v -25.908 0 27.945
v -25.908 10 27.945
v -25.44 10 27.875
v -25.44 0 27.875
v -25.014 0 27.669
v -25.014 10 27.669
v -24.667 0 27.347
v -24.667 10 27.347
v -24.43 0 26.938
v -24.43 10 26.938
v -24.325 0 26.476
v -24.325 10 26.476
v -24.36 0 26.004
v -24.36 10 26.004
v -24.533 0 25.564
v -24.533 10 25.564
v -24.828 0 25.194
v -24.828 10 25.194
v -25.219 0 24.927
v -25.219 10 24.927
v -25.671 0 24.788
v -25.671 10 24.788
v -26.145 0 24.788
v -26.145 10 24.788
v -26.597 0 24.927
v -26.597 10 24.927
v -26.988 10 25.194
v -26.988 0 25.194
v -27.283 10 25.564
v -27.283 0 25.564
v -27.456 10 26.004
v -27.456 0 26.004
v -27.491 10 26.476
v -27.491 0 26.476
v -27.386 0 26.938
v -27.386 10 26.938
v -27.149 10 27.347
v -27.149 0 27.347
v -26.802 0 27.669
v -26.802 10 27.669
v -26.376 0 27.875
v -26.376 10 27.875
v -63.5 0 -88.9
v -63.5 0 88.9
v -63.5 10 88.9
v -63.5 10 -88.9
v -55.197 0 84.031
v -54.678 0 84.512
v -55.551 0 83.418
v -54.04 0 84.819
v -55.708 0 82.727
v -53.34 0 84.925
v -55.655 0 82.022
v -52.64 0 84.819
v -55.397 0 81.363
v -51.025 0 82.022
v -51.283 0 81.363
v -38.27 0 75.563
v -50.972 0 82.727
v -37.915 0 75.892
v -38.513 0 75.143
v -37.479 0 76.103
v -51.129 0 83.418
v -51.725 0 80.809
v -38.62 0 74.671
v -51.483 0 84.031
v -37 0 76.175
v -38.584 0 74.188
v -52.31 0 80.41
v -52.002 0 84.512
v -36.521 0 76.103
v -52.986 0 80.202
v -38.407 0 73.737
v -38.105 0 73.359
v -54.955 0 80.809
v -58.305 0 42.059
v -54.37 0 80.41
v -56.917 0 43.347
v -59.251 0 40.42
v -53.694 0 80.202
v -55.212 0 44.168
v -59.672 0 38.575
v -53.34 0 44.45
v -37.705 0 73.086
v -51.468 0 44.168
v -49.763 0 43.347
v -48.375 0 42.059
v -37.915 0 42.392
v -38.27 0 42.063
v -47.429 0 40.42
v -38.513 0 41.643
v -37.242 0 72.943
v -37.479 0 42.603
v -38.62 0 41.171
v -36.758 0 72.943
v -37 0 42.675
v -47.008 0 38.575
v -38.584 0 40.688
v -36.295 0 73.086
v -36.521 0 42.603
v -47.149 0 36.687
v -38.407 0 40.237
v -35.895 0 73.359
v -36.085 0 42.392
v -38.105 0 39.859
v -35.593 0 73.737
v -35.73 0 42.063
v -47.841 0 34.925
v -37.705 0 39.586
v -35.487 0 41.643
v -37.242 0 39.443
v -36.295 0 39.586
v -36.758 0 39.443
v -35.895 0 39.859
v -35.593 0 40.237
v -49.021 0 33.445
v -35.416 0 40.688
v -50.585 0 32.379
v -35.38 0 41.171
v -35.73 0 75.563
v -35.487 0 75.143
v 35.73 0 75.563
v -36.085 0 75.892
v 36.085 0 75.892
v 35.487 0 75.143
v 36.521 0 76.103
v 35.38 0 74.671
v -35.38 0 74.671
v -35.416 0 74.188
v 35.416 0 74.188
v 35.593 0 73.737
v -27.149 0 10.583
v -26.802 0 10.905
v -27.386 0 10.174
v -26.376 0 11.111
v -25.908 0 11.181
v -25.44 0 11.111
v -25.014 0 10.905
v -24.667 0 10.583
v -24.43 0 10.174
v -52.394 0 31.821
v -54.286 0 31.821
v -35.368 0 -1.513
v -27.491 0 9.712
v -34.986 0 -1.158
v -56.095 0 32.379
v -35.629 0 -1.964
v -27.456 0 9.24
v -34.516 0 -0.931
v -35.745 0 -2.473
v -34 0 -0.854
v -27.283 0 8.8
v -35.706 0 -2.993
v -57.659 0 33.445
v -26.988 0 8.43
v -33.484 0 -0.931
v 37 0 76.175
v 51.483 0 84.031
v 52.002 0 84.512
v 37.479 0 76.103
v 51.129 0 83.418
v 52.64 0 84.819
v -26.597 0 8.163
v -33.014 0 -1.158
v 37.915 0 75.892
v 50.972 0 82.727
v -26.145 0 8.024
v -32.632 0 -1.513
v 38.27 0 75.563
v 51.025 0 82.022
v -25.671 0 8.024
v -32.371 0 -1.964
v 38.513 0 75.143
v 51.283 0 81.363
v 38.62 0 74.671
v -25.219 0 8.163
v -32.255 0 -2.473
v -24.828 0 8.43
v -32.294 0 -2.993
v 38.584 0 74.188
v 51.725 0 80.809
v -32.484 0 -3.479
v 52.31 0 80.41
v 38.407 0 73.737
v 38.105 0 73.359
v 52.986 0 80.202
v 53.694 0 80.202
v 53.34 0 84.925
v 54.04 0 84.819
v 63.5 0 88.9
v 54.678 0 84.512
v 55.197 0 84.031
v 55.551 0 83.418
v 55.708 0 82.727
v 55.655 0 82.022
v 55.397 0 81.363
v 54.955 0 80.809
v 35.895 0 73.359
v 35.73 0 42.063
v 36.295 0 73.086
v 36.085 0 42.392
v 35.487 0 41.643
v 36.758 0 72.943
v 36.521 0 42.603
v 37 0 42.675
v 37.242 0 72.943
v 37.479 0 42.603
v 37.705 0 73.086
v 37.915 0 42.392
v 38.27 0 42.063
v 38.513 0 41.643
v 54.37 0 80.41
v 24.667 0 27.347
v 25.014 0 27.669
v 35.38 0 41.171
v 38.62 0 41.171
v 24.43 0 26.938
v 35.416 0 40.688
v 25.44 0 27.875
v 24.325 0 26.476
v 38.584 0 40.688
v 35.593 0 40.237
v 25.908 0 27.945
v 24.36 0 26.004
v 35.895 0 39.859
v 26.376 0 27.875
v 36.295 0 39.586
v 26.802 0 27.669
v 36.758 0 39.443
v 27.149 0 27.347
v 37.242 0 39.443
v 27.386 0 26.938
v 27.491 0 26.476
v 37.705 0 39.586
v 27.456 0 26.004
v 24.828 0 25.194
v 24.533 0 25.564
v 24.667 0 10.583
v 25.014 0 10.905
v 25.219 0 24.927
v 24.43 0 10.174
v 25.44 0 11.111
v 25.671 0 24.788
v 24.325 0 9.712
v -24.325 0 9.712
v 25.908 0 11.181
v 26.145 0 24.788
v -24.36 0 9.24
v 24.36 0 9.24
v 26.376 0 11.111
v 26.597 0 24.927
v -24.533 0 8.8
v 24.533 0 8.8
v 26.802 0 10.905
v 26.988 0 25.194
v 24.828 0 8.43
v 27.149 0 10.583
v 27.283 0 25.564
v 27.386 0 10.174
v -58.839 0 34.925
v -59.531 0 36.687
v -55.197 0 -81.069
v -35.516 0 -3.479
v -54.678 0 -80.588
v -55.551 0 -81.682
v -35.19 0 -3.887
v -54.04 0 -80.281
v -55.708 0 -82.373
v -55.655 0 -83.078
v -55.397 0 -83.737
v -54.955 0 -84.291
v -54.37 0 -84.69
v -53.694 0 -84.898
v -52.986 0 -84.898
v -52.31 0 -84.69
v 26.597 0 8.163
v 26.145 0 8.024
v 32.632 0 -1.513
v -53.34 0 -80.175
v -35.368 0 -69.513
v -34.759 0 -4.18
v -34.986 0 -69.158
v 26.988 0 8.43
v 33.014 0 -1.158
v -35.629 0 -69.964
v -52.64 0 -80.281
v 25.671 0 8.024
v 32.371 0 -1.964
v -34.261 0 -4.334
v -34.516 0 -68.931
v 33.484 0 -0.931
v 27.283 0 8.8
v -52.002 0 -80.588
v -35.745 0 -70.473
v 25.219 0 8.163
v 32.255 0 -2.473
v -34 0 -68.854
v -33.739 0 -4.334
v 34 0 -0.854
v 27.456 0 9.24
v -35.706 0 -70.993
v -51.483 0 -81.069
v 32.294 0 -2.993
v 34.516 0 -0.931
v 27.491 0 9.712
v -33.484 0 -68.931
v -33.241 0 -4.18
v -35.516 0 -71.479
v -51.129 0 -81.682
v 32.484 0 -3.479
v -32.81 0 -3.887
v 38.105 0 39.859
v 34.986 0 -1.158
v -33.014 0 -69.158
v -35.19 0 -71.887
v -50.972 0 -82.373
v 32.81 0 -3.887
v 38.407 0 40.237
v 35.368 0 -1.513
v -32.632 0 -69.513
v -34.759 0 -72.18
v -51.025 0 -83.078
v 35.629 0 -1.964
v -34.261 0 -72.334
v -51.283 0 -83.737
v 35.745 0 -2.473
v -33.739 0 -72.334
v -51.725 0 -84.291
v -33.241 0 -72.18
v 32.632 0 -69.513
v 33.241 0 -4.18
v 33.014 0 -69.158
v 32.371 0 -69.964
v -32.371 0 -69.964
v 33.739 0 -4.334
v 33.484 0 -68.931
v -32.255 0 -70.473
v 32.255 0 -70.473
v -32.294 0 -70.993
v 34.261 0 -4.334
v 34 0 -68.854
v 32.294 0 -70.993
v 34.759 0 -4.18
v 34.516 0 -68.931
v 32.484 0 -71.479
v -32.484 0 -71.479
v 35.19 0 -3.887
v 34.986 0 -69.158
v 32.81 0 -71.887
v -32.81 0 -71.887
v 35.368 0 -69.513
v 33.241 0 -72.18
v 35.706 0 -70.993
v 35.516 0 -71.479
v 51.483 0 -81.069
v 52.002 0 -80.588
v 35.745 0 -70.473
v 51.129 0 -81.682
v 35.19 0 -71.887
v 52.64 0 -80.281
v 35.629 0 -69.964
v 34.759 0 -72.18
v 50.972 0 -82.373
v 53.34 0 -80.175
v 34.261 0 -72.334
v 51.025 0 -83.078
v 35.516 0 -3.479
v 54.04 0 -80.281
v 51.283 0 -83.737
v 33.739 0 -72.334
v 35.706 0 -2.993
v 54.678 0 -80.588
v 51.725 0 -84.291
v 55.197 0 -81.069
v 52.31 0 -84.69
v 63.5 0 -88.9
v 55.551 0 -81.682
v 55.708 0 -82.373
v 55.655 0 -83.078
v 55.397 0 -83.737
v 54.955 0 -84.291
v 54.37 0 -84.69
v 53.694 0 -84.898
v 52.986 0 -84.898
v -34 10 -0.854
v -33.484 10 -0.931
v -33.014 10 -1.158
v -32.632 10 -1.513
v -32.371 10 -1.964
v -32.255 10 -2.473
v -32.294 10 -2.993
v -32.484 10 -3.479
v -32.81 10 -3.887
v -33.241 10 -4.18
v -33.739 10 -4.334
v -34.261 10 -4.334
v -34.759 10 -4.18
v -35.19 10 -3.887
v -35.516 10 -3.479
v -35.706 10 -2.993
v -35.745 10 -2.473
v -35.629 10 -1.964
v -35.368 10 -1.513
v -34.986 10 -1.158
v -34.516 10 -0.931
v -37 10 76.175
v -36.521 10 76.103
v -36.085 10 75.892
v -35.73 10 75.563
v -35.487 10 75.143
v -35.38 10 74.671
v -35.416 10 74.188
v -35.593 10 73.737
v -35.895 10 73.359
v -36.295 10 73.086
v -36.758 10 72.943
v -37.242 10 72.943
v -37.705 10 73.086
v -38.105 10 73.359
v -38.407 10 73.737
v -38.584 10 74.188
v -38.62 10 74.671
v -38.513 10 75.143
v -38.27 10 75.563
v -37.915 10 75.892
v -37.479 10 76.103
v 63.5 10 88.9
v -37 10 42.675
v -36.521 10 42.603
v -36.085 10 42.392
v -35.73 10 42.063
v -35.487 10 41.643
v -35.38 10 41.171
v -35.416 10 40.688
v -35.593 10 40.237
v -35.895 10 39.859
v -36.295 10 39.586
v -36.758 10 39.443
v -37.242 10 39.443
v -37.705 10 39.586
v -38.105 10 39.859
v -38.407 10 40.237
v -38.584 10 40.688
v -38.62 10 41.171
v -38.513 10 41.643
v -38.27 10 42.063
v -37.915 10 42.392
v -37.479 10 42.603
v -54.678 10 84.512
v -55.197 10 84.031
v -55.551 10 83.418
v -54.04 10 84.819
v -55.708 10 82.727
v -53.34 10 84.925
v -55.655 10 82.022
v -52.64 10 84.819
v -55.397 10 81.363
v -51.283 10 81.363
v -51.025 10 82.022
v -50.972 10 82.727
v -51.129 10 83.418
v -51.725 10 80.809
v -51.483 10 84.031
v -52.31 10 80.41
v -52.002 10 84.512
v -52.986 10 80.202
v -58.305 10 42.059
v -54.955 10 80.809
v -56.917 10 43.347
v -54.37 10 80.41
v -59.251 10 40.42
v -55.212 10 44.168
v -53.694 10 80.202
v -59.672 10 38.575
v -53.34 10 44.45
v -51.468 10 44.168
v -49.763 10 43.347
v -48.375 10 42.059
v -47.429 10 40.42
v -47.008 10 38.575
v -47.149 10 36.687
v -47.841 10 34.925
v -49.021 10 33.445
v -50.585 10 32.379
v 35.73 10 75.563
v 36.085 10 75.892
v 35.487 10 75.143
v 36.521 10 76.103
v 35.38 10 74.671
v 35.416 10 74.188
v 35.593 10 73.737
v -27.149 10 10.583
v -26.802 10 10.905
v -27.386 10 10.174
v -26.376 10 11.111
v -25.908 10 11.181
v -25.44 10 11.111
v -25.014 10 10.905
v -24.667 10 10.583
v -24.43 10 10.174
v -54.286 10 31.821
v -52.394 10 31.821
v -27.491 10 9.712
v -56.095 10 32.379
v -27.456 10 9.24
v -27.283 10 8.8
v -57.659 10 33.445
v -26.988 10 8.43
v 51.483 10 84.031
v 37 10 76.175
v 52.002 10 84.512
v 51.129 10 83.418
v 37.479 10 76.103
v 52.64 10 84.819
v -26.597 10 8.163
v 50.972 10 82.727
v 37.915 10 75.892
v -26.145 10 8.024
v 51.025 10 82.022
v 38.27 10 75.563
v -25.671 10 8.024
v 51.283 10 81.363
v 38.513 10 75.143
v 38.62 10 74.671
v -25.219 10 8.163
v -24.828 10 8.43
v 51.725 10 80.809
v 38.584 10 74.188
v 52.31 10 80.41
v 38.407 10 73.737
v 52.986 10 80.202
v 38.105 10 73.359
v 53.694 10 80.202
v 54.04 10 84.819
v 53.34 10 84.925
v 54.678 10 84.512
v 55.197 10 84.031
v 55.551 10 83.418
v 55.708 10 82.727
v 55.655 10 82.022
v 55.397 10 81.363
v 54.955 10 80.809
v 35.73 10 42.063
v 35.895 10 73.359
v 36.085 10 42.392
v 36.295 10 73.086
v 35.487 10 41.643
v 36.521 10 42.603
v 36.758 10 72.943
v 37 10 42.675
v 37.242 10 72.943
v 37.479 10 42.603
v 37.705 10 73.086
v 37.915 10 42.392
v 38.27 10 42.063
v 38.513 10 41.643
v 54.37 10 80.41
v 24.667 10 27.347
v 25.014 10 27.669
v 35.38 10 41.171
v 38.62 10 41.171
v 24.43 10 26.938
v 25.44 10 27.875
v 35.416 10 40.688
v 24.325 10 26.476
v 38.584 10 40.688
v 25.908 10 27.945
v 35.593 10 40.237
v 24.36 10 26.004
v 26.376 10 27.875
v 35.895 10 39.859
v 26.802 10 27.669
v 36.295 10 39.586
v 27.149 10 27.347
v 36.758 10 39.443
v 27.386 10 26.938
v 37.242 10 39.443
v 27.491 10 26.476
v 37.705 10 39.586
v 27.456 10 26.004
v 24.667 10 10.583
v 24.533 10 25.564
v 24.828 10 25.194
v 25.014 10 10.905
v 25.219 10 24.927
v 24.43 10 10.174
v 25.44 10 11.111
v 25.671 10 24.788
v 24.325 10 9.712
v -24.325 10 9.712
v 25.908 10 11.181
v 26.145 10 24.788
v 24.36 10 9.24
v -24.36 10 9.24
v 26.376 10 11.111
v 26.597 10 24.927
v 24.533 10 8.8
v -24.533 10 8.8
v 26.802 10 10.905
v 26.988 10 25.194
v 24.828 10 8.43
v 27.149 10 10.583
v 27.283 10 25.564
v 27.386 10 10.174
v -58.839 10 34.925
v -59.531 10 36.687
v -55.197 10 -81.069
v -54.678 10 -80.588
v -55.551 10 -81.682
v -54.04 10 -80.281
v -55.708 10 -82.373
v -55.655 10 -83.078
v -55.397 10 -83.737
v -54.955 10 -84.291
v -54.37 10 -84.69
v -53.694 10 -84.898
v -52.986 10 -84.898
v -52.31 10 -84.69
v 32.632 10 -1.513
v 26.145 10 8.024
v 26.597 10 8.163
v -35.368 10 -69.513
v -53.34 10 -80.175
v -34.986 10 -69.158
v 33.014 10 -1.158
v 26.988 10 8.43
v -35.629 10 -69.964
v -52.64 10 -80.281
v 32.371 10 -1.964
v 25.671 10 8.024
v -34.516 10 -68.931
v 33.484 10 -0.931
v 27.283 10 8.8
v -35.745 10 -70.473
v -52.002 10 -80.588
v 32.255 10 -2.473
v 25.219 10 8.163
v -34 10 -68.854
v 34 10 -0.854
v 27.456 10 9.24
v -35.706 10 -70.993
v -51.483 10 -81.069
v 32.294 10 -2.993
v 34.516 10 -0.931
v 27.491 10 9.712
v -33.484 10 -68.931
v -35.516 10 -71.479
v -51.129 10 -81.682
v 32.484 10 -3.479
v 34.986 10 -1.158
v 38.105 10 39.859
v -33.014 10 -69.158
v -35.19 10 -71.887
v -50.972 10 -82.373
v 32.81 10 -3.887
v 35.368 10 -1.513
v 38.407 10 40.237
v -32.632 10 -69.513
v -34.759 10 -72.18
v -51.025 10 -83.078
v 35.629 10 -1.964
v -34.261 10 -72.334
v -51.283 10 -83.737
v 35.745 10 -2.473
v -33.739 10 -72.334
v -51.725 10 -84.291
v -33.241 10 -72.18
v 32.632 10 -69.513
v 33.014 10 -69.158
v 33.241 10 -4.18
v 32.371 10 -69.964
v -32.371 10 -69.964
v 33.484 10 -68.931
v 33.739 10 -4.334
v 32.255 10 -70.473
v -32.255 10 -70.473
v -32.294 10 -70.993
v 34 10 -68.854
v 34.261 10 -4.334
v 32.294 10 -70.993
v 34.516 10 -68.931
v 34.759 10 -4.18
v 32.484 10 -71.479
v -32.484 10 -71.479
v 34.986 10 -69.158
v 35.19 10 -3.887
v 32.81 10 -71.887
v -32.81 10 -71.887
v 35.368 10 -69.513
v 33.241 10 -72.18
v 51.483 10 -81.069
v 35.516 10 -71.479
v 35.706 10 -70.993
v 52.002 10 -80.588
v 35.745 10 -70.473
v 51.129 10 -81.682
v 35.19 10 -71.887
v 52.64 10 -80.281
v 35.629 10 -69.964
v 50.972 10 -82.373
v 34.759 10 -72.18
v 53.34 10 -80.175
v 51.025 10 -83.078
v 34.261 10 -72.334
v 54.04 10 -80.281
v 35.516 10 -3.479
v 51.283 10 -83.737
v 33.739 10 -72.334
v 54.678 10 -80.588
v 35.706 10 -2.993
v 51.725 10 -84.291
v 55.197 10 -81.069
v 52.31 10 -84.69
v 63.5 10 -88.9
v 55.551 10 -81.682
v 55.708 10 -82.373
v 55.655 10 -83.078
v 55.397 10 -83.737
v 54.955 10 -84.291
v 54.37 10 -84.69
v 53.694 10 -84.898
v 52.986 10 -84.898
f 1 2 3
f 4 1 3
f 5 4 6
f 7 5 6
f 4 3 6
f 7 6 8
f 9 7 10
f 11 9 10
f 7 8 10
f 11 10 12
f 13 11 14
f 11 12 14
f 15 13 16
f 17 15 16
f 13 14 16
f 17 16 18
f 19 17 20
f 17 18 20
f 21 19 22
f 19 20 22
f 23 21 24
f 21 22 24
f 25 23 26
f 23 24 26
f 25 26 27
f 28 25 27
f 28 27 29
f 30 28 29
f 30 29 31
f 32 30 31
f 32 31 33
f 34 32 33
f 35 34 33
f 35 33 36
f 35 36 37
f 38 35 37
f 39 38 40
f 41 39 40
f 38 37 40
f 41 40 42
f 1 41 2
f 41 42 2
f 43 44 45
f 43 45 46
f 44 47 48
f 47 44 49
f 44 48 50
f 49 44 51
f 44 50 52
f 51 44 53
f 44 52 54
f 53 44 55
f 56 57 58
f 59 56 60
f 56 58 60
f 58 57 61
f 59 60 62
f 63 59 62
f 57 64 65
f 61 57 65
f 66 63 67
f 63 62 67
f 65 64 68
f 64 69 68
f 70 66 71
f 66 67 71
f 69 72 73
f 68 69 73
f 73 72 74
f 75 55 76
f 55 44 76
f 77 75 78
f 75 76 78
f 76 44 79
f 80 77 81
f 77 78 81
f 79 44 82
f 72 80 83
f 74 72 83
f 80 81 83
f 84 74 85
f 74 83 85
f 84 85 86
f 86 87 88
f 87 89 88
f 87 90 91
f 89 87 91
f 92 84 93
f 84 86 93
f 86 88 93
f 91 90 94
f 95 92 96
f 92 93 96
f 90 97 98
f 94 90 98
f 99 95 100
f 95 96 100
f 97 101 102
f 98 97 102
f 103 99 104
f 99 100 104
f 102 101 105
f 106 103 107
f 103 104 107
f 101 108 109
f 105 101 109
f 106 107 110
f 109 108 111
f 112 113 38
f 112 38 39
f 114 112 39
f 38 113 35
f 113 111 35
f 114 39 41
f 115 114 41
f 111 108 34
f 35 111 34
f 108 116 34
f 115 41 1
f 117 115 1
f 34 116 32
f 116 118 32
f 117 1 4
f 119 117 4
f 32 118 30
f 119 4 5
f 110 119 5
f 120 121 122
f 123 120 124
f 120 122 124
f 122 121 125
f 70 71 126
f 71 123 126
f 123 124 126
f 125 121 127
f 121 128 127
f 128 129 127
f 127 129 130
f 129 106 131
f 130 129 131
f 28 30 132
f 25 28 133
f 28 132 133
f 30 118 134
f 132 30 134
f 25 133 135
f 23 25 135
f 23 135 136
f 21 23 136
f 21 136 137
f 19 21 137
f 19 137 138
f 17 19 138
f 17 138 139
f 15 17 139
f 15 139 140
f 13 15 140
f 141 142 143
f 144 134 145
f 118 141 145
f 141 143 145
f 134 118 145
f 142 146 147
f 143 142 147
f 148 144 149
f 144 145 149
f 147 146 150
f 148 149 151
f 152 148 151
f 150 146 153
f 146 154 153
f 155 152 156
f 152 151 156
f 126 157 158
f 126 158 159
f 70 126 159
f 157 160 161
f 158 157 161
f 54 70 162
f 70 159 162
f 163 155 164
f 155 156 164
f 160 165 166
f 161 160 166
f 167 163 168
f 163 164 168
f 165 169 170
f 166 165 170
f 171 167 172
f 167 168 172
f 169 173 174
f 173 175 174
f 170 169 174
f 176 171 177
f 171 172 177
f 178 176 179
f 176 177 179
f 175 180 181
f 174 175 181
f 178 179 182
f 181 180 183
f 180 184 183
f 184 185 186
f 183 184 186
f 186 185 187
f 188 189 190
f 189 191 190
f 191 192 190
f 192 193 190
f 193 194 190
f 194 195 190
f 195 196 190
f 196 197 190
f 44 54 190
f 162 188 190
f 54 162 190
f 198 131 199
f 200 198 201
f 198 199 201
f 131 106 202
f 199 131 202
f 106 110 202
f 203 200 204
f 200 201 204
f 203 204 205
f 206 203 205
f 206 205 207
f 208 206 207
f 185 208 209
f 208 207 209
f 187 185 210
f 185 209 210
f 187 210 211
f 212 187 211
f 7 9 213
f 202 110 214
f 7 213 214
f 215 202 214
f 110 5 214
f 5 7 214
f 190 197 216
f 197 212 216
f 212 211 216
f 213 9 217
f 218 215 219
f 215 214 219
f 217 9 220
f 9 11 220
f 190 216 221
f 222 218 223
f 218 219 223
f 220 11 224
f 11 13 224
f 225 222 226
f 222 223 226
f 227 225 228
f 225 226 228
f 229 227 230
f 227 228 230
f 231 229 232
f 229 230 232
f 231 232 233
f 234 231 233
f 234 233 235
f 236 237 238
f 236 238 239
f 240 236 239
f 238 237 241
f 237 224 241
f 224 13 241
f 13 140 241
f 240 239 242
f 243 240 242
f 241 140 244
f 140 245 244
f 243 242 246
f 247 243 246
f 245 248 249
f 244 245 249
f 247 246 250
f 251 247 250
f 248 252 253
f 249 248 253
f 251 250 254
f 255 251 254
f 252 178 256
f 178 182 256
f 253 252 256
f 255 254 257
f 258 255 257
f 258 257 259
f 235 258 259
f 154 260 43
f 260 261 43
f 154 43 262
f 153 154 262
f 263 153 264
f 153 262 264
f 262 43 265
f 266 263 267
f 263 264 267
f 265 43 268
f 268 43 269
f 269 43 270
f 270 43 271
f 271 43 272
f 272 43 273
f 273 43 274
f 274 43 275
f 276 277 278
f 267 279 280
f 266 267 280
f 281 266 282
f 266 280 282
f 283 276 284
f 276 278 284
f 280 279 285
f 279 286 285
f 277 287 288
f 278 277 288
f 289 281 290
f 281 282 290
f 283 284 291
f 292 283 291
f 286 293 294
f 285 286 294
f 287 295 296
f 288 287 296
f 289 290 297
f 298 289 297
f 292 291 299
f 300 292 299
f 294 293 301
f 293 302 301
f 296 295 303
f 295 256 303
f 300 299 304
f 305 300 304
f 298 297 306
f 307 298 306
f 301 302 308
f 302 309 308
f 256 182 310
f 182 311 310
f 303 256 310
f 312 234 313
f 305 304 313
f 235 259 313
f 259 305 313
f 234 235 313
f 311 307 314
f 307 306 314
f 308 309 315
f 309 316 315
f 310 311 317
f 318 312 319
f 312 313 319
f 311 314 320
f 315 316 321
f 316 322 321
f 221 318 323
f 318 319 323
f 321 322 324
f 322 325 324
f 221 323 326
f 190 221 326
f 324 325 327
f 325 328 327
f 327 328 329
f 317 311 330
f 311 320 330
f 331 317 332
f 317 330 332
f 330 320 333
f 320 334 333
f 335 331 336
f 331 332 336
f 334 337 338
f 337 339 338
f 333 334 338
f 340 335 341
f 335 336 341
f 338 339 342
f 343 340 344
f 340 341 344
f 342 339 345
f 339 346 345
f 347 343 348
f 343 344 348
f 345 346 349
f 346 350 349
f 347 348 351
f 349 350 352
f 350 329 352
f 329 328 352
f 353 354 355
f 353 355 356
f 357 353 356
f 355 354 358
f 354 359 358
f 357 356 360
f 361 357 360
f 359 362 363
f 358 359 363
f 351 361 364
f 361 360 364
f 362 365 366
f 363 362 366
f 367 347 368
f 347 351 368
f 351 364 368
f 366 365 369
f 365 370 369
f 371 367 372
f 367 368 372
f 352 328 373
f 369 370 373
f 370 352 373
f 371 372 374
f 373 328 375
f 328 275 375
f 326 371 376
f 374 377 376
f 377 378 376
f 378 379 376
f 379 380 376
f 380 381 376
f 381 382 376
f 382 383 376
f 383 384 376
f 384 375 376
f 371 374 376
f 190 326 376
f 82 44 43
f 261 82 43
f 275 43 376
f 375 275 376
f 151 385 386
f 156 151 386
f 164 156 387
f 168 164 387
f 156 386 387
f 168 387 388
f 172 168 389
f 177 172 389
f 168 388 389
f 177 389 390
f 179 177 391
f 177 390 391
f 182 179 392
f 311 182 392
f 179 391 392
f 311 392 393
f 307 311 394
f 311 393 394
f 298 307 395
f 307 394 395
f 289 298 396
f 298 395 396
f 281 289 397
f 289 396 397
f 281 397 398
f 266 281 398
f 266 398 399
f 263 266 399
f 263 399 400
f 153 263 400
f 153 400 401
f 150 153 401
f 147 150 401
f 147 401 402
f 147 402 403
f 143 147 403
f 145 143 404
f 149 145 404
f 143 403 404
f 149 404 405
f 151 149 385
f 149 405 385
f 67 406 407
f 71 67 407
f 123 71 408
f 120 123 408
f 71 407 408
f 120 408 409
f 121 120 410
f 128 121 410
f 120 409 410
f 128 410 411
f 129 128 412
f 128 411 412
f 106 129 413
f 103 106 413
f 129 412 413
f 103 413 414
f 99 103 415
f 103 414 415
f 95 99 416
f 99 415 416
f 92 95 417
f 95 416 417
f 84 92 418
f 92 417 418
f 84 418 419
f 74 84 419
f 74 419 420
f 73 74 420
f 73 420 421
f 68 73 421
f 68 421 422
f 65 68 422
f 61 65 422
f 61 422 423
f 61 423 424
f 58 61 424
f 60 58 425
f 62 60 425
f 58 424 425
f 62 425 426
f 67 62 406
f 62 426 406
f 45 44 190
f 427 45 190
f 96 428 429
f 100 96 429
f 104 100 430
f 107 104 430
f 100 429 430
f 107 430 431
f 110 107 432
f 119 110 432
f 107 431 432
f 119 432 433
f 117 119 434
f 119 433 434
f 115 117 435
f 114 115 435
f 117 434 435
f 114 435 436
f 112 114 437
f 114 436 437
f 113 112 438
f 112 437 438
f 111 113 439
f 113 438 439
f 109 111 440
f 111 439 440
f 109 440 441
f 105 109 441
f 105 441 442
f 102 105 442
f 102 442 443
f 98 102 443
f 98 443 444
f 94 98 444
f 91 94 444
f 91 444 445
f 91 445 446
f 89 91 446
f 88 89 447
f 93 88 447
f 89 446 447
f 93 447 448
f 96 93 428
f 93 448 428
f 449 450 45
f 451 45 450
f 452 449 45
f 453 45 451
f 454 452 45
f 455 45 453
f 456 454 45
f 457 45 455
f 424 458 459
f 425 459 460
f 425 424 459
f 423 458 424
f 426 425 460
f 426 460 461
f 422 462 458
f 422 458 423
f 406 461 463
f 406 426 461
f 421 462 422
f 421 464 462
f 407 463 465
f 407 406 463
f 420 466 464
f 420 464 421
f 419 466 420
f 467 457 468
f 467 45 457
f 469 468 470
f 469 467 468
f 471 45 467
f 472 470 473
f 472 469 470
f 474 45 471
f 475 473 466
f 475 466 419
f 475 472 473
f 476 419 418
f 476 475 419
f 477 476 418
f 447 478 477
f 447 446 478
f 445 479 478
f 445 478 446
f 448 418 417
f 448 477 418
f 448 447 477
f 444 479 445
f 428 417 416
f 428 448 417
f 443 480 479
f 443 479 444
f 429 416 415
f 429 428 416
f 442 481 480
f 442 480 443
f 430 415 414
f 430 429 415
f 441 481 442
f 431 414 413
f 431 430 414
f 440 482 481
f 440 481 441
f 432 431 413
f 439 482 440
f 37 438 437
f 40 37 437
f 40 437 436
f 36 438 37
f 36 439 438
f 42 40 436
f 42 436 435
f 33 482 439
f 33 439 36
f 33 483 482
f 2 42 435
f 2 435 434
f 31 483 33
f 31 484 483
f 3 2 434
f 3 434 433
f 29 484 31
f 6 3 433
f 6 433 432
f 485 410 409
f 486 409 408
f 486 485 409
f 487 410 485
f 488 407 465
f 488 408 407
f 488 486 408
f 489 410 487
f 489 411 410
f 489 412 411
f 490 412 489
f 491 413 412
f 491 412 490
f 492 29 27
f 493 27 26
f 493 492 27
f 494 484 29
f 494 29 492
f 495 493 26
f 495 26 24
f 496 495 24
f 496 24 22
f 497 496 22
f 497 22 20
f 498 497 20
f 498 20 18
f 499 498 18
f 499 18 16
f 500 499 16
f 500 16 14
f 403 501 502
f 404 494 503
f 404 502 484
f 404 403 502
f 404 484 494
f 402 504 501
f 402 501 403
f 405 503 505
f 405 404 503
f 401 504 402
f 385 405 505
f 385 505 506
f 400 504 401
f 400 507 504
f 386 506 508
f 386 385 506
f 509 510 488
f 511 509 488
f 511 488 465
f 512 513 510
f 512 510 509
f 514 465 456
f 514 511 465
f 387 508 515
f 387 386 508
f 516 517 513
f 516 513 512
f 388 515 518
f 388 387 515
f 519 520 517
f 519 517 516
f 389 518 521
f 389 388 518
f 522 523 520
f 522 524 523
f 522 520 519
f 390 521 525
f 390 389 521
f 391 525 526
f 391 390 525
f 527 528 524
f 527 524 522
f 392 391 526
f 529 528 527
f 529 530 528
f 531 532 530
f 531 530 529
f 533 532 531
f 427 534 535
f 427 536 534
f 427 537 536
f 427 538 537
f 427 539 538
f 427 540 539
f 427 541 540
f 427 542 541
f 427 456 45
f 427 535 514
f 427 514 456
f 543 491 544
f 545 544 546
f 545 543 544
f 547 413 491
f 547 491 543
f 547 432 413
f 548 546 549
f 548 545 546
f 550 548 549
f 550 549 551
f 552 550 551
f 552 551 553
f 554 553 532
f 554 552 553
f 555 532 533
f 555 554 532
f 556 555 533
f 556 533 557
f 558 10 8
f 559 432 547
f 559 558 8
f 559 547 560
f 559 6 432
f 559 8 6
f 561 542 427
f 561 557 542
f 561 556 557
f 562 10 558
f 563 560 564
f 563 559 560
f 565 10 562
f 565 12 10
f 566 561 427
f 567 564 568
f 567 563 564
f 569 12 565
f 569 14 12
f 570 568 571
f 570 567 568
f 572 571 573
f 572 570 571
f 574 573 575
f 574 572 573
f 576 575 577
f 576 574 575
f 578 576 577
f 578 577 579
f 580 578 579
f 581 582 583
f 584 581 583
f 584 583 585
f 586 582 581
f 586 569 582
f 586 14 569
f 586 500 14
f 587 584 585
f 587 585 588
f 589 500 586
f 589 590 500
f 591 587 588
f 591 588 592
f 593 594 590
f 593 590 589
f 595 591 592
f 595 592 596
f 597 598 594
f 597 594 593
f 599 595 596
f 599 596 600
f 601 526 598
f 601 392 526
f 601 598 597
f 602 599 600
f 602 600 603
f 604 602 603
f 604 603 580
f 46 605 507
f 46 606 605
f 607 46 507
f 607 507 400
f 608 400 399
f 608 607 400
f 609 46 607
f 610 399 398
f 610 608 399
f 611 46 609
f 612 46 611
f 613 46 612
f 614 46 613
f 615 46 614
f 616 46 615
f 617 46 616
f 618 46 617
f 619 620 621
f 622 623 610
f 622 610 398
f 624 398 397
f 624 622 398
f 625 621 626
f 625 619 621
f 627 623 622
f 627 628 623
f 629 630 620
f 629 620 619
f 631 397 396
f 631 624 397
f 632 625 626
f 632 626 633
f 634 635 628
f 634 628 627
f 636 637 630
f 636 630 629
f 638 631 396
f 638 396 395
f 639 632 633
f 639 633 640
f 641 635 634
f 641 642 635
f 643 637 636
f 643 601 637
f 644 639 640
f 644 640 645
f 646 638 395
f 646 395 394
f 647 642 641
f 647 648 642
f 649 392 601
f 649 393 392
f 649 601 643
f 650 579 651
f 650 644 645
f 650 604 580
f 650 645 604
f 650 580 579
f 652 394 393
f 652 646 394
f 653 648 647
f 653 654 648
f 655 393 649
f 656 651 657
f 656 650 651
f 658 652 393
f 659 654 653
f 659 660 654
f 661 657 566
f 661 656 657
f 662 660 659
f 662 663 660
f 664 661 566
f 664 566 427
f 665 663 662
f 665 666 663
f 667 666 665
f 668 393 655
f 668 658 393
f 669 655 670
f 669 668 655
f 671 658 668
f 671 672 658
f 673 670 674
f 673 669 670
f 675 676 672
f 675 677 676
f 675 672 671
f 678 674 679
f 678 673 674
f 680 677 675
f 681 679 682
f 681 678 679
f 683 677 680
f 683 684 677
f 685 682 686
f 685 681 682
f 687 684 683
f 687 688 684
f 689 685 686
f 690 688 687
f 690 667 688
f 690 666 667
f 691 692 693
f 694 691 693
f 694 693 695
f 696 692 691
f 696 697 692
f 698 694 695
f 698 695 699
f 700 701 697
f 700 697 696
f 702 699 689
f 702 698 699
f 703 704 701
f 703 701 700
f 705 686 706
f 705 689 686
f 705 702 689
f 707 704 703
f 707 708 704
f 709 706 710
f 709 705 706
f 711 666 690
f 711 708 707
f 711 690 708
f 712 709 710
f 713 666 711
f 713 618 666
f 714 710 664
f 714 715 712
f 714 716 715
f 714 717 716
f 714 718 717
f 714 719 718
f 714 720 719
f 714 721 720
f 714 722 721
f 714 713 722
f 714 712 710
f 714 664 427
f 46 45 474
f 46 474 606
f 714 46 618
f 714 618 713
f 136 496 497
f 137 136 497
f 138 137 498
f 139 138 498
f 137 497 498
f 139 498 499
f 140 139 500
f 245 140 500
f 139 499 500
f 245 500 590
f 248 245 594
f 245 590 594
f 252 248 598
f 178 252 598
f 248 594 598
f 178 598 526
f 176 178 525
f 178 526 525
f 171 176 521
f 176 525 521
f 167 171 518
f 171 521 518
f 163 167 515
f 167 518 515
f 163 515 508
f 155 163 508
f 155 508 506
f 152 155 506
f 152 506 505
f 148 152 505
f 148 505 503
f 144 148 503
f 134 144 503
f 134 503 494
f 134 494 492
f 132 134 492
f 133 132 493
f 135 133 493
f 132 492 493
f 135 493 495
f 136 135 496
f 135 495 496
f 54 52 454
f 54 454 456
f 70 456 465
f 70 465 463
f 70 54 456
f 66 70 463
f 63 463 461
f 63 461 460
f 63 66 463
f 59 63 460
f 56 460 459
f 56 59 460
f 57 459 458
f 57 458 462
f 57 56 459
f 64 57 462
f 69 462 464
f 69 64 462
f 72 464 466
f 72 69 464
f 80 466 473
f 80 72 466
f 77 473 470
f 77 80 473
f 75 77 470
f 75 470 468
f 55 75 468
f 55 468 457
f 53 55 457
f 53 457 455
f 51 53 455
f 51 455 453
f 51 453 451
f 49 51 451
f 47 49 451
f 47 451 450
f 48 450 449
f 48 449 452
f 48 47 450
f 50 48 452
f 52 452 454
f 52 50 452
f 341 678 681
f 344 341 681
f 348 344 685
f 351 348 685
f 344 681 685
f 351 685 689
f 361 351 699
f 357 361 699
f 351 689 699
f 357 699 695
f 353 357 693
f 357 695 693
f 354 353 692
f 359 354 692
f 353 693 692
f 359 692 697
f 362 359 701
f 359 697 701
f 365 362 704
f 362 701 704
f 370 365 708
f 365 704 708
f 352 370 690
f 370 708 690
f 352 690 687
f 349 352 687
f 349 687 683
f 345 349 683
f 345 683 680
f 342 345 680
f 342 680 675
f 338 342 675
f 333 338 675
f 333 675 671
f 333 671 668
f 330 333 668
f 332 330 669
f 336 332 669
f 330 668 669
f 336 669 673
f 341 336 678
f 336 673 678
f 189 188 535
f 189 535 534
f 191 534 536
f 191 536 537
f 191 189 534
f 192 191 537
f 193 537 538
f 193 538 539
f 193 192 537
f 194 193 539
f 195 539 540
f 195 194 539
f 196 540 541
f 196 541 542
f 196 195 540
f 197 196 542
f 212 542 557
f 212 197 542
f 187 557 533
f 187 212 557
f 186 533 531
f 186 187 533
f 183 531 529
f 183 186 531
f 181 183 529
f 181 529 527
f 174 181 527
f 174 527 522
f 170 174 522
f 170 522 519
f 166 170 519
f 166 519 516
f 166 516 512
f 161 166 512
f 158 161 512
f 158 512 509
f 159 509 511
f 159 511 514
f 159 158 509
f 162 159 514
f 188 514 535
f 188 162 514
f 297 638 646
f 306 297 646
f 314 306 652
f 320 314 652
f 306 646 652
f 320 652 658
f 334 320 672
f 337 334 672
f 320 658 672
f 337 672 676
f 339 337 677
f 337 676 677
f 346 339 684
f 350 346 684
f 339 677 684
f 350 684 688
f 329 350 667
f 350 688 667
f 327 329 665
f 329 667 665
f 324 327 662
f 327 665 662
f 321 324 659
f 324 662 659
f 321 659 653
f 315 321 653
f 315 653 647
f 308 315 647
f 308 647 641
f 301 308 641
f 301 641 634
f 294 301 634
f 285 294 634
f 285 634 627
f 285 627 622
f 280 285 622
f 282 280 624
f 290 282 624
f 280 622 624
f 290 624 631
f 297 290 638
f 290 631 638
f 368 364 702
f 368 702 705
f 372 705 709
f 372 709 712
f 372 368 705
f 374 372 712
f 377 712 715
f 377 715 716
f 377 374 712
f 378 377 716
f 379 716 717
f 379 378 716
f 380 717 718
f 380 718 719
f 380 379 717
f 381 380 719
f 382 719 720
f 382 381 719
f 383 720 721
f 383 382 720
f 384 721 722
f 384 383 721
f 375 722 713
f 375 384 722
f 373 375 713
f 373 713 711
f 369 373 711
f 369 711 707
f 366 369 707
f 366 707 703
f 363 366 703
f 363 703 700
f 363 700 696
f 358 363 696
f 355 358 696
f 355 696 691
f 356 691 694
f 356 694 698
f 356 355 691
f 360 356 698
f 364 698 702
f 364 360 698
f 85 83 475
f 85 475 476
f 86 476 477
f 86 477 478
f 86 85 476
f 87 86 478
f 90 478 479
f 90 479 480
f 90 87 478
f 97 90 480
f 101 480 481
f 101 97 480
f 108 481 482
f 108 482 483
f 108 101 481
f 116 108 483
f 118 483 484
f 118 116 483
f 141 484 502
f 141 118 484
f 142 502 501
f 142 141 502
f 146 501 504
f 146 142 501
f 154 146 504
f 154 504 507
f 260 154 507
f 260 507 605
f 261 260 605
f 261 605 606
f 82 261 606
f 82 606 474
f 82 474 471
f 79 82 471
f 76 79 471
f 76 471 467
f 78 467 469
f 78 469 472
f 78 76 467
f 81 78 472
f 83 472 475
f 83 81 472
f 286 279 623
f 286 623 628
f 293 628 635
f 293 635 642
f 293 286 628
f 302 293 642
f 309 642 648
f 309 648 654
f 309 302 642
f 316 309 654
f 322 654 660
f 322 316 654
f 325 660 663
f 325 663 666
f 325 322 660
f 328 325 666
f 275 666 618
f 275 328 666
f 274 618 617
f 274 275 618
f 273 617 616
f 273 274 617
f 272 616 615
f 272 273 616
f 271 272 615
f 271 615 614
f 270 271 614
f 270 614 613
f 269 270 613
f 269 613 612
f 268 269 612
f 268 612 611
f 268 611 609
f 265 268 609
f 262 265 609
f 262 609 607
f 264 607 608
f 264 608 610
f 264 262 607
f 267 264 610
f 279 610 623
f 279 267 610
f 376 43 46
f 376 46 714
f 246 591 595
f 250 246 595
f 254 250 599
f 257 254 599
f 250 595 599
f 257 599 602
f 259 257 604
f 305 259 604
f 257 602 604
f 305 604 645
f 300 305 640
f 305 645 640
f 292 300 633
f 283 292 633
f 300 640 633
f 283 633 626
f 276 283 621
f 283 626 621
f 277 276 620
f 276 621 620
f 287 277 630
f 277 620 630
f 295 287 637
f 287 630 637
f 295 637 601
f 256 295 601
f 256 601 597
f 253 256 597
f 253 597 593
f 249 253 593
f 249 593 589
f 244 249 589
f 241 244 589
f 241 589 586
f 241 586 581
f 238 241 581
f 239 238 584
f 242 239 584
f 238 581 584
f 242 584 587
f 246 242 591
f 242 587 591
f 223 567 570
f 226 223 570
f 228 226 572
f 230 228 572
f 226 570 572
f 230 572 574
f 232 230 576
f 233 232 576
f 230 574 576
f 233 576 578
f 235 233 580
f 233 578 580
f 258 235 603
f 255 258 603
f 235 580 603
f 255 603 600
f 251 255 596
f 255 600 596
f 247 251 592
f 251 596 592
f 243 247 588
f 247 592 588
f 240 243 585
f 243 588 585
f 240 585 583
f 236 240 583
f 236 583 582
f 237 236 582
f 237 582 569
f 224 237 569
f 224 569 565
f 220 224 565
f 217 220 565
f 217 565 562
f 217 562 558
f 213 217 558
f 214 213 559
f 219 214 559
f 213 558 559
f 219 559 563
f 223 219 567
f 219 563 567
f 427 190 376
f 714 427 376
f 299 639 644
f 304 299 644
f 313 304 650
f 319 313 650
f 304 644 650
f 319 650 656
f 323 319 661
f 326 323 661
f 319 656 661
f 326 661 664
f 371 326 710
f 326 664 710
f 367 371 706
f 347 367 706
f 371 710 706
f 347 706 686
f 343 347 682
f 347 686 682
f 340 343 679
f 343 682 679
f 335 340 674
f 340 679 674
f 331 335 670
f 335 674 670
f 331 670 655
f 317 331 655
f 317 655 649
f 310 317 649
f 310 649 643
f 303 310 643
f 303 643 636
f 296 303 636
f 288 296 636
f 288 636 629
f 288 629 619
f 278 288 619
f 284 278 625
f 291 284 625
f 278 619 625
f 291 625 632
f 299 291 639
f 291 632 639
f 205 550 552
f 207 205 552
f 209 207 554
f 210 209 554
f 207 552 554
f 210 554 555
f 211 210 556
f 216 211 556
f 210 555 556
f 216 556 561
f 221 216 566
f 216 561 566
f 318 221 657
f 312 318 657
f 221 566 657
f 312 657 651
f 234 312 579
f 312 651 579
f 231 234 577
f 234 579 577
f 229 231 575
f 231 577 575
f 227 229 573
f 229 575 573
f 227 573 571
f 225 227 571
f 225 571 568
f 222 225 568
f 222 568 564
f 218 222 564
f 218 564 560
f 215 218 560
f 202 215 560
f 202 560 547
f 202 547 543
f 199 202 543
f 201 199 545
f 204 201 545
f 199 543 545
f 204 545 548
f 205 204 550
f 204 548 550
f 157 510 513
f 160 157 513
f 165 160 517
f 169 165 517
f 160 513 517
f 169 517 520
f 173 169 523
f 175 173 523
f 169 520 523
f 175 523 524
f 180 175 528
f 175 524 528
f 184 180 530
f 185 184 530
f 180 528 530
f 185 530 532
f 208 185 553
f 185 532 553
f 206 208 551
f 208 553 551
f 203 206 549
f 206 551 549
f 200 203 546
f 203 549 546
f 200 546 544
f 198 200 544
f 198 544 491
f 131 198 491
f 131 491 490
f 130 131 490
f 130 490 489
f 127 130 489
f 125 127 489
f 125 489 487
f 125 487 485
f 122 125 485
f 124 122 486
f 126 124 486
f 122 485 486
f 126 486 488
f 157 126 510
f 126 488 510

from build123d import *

# Parameters (mm, degrees)
SKETCH1_W           = 127
SKETCH1_H           = 177.8
SKETCH1_R           = 2.3749
SKETCH1_R_2         = 6.35
BOSS_EXTRUDE1_DEPTH = 10
SKETCH8_R           = 1.625
BREADBOARD_DEPTH    = 10
SKETCH9_R           = 1.75
FPGA_DEPTH          = 10
SKETCH10_R          = 1.5875
F_8PUSH_BTN_DEPTH   = 10


with BuildPart() as part:
    # Sketch1 → Boss-Extrude1 (new body)
    with BuildSketch(Plane(origin=(0, 0, 0), x_dir=(1, 0, 0), z_dir=(0, 1, 0))):
        Rectangle(SKETCH1_W, SKETCH1_H)
        with Locations(Location((-53.34, 82.55, 0), (0, 0, 270))):  # turned: the seam where the file's is
            Circle(SKETCH1_R, mode=Mode.SUBTRACT)
        with Locations(Location((53.34, 82.55, 0), (0, 0, 270))):  # turned: the seam where the file's is
            Circle(SKETCH1_R, mode=Mode.SUBTRACT)
        with Locations(Location((53.34, -82.55, 0), (0, 0, 270))):  # turned: the seam where the file's is
            Circle(SKETCH1_R, mode=Mode.SUBTRACT)
        with Locations(Location((-53.34, -82.55, 0), (0, 0, 270))):  # turned: the seam where the file's is
            Circle(SKETCH1_R, mode=Mode.SUBTRACT)
        with Locations(Location((-53.34, -38.1, 0), (0, 0, 270))):  # turned: the seam where the file's is
            Circle(SKETCH1_R_2, mode=Mode.SUBTRACT)
    extrude(amount=BOSS_EXTRUDE1_DEPTH)

    # Sketch8 → Breadboard (cut)
    with BuildSketch(Plane(origin=(0, 10, 0), x_dir=(1, 0, 0), z_dir=(0, 1, 0))):
        with Locations(Location((37, -74.5497835, 0), (0, 0, 270))):  # turned: the seam where the file's is
            Circle(SKETCH8_R)
        with Locations(Location((-37, -74.5497835, 0), (0, 0, 270))):  # turned: the seam where the file's is
            Circle(SKETCH8_R)
        with Locations(Location((-37, -41.0497835, 0), (0, 0, 270))):  # turned: the seam where the file's is
            Circle(SKETCH8_R)
        with Locations(Location((37, -41.0497835, 0), (0, 0, 270))):  # turned: the seam where the file's is
            Circle(SKETCH8_R)
    extrude(amount=-BREADBOARD_DEPTH, mode=Mode.SUBTRACT)

    # Sketch9 → FPGA (cut)
    with BuildSketch(Plane(origin=(0, 10, 0), x_dir=(1, 0, 0), z_dir=(0, 1, 0))):
        with Locations(Location((-34, 70.603714811, 0), (0, 0, 270))):  # turned: the seam where the file's is
            Circle(SKETCH9_R)
        with Locations(Location((34, 70.603714811, 0), (0, 0, 270))):  # turned: the seam where the file's is
            Circle(SKETCH9_R)
        with Locations(Location((34, 2.603714811, 0), (0, 0, 270))):  # turned: the seam where the file's is
            Circle(SKETCH9_R)
        with Locations(Location((-34, 2.603714811, 0), (0, 0, 270))):  # turned: the seam where the file's is
            Circle(SKETCH9_R)
    extrude(amount=-FPGA_DEPTH, mode=Mode.SUBTRACT)

    # Sketch10 → 8Push_btn (cut)
    with BuildSketch(Plane(origin=(0, 10, 0), x_dir=(1, 0, 0), z_dir=(0, 1, 0))):
        with Locations(Location((-25.908, -9.593705545, 0), (0, 0, 270))):  # turned: the seam where the file's is
            Circle(SKETCH10_R)
        with Locations(Location((-25.908, -26.357705545, 0), (0, 0, 270))):  # turned: the seam where the file's is
            Circle(SKETCH10_R)
        with Locations(Location((25.908, -26.357705545, 0), (0, 0, 270))):  # turned: the seam where the file's is
            Circle(SKETCH10_R)
        with Locations(Location((25.908, -9.593705545, 0), (0, 0, 270))):  # turned: the seam where the file's is
            Circle(SKETCH10_R)
    extrude(amount=-F_8PUSH_BTN_DEPTH, mode=Mode.SUBTRACT)


solid = part.part
